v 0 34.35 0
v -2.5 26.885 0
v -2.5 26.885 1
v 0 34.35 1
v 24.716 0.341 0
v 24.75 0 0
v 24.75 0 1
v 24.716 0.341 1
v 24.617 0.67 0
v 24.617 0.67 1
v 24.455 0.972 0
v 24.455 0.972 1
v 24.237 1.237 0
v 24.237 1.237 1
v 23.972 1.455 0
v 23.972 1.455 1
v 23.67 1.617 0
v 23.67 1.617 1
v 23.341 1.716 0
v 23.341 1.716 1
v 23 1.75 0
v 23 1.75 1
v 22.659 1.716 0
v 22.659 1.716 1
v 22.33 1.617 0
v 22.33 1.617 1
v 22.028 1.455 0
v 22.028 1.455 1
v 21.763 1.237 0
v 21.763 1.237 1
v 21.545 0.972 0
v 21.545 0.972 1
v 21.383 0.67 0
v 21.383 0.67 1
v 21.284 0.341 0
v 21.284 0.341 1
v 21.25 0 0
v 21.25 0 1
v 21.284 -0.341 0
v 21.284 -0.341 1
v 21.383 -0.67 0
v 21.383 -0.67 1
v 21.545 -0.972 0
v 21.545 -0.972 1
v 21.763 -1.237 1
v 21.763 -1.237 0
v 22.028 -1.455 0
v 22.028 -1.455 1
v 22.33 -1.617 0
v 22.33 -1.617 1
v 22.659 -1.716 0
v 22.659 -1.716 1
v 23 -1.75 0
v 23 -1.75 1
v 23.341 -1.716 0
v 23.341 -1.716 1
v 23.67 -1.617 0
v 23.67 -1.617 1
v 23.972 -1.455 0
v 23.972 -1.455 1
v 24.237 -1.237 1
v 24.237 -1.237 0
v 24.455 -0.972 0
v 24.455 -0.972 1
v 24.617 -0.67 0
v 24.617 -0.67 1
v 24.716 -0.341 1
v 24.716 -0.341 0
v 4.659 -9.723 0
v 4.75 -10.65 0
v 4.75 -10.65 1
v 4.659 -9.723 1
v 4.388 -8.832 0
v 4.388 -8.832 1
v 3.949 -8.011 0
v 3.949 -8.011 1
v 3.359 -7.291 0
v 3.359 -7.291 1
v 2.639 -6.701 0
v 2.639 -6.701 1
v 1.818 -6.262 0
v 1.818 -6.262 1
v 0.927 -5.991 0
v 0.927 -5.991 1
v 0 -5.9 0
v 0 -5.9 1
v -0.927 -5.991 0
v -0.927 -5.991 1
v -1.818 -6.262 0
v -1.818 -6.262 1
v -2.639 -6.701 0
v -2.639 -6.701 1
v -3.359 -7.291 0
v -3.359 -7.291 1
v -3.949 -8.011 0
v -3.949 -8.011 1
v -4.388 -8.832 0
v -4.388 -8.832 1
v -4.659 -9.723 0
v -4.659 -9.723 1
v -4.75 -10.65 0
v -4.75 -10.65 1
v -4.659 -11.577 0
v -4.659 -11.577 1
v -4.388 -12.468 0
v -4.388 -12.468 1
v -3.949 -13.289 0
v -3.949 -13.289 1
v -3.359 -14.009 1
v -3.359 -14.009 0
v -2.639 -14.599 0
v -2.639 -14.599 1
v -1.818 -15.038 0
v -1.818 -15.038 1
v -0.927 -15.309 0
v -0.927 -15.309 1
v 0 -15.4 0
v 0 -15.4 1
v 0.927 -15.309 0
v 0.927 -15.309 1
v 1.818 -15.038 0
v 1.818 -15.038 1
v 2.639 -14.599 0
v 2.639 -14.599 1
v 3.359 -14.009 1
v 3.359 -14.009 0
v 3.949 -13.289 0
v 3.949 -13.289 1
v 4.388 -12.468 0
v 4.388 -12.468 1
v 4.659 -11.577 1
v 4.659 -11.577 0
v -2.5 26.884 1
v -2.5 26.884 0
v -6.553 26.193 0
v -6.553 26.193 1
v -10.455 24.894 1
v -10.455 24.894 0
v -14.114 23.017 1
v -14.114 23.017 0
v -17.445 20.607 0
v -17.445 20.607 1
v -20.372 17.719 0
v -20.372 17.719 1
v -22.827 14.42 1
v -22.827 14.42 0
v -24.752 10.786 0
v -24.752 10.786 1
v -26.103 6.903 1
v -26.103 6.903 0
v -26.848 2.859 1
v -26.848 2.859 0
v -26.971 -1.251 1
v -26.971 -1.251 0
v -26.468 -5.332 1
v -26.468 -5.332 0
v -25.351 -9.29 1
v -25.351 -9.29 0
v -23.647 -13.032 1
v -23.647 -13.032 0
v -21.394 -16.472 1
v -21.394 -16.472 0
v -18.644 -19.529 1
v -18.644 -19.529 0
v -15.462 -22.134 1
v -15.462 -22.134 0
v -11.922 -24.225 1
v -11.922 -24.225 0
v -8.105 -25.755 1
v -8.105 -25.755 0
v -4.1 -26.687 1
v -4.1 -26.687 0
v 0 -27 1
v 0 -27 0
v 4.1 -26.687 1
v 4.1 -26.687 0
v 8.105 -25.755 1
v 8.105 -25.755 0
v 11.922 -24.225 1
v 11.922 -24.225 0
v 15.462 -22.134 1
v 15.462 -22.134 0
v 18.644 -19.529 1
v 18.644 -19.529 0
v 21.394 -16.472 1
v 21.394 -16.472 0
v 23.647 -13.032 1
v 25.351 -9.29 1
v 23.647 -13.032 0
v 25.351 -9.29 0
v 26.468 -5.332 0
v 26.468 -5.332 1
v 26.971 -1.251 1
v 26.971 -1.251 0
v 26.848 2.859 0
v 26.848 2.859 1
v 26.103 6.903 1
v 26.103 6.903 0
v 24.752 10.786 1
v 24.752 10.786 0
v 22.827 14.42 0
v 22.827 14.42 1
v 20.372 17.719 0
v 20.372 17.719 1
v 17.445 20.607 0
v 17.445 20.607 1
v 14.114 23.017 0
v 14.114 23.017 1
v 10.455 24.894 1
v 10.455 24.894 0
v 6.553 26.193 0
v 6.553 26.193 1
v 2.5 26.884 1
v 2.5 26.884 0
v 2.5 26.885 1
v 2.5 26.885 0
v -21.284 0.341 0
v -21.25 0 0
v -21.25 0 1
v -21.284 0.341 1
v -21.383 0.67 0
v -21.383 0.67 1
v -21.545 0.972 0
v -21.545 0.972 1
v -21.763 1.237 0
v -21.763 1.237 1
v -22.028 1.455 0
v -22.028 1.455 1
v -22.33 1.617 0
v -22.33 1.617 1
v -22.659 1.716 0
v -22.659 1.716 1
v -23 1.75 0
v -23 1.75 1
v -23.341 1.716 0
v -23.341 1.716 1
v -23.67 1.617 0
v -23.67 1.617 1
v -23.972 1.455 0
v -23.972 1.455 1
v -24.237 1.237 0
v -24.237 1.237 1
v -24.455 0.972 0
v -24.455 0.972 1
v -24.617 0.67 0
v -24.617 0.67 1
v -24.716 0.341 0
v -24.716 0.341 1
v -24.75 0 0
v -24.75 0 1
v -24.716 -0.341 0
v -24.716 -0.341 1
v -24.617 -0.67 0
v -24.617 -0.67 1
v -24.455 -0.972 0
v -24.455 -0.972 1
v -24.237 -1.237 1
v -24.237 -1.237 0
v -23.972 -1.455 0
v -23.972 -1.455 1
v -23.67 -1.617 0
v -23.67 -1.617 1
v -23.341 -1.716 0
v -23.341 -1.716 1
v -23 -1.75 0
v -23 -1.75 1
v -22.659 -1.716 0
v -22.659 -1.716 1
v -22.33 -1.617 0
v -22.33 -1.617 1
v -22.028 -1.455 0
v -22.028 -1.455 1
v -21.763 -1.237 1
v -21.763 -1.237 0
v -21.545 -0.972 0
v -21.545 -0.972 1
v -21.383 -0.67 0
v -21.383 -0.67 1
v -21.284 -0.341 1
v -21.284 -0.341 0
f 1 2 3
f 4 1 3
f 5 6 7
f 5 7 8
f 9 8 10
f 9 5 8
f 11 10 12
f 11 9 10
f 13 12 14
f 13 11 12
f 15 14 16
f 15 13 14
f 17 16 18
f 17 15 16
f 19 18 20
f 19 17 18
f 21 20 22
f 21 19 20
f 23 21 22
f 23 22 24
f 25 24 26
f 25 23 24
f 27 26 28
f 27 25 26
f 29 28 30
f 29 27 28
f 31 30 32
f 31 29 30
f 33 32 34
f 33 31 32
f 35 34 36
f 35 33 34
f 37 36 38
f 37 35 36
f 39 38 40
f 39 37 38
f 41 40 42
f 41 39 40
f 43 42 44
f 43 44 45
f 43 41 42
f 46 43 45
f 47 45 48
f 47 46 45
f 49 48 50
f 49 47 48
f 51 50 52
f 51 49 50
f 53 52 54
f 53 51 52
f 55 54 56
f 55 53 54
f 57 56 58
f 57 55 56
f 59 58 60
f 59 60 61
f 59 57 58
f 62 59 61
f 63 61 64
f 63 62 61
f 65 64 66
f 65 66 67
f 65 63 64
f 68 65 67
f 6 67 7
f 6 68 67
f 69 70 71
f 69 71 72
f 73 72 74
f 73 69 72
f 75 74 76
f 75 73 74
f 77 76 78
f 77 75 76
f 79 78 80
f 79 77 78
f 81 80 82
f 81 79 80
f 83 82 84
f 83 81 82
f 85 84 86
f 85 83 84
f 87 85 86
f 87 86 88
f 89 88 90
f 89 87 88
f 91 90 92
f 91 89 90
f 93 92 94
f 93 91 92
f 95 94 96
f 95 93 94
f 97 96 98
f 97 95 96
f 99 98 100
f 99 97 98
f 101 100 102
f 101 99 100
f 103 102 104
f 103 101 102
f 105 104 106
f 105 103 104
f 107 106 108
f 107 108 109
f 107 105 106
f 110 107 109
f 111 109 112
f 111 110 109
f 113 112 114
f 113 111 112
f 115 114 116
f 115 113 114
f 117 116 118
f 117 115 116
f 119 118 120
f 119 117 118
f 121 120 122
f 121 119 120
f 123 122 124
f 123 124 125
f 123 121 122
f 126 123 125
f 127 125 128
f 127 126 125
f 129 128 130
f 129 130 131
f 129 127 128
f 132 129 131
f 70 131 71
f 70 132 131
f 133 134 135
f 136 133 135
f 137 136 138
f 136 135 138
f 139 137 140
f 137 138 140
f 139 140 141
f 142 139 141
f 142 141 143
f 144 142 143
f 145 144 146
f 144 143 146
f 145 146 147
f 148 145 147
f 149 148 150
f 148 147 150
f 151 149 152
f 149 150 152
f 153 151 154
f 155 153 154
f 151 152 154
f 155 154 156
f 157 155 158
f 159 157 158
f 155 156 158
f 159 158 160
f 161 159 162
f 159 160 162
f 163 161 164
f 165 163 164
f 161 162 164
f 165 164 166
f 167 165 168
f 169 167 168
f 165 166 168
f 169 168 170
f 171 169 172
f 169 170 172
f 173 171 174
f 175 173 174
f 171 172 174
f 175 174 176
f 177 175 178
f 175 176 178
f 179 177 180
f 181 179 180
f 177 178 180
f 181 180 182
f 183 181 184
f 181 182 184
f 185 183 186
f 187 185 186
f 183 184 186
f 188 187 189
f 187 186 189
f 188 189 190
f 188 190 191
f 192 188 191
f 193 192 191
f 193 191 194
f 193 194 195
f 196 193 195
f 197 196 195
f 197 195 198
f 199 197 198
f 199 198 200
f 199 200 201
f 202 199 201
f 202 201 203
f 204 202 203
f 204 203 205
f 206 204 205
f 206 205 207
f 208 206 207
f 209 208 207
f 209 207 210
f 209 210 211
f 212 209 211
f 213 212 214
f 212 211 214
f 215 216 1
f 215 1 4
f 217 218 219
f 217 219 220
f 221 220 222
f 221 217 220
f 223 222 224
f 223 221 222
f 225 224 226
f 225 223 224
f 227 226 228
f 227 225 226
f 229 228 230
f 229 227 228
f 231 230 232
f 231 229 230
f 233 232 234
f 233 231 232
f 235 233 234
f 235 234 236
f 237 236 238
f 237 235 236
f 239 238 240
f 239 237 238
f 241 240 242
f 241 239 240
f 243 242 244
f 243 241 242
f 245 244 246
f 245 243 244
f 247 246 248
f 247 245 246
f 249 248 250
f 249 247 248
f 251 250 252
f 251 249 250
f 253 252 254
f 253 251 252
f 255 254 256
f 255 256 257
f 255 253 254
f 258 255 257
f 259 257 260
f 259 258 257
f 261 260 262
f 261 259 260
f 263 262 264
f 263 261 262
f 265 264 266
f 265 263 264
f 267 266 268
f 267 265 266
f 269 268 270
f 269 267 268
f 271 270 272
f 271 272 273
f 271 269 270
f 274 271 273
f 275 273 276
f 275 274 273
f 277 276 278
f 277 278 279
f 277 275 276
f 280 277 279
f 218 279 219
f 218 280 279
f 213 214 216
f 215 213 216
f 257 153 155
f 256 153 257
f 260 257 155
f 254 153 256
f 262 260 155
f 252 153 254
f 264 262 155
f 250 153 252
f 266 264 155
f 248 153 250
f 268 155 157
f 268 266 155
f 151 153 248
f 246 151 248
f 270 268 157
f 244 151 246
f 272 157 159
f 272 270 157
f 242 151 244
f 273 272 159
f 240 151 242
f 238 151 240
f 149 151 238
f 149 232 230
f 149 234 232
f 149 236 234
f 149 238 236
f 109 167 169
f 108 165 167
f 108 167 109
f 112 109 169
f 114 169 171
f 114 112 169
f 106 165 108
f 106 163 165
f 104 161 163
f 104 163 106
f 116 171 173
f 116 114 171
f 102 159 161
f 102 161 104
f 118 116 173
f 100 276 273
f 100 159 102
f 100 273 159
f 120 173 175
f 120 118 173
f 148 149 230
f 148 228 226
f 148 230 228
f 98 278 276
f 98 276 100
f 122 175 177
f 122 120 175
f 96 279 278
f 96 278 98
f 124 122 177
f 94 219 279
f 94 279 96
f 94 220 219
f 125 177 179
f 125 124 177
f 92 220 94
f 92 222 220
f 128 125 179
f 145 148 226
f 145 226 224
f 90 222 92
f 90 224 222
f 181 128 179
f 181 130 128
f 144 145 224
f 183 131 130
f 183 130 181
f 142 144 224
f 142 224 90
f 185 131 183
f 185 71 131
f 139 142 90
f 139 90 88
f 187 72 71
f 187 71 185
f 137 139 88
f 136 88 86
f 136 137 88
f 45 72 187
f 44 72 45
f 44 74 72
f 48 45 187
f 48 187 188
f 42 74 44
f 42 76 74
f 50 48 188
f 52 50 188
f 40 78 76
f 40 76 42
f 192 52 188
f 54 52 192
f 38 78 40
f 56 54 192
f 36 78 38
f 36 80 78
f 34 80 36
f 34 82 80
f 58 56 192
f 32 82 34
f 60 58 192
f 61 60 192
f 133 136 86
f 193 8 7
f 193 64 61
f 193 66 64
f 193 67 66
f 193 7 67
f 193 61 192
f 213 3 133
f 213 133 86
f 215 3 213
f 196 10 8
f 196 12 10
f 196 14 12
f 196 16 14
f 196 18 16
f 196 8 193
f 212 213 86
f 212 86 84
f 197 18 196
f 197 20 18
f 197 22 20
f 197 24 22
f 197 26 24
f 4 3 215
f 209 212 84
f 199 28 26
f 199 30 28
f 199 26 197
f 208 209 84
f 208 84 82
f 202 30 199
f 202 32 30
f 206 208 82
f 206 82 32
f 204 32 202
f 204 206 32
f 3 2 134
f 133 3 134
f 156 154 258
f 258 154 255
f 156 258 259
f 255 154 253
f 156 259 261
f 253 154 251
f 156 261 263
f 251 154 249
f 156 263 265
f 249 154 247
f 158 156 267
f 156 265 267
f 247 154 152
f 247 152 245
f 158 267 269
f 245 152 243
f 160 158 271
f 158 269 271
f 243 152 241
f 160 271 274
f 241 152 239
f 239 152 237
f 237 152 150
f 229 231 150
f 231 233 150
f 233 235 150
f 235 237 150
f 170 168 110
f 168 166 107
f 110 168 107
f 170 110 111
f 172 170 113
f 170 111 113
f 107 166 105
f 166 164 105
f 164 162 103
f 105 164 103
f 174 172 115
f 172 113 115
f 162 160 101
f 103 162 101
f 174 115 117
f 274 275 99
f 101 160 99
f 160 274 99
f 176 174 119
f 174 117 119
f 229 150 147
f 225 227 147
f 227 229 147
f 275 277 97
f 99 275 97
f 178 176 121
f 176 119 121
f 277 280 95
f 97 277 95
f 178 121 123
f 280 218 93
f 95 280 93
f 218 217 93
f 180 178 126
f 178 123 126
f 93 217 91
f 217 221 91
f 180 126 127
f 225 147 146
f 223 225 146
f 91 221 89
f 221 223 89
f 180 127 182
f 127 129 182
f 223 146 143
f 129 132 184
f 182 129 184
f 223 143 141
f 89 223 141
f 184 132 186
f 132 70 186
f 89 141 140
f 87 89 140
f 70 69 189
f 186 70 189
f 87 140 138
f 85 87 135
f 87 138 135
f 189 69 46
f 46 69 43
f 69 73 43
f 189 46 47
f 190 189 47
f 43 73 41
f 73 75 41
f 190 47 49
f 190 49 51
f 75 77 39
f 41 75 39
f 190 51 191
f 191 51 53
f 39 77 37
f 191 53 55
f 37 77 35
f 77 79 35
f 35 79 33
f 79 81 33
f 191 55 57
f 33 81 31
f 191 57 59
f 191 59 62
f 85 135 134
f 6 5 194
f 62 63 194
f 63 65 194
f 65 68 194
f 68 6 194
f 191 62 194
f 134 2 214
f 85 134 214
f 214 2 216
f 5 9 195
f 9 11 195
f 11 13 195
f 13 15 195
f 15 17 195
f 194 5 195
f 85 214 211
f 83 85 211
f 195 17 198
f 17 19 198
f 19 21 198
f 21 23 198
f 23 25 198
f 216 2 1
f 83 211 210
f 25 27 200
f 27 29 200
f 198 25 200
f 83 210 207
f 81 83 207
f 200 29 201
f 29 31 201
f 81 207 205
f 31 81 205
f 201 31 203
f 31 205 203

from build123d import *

# Parameters (mm, degrees)
F0_R       = 1.75
F0_R_2     = 4.75
F1_DEPTH   = 1
F2_SIZE2   = 2.5
F2_SIZE    = 7.465
F2_2_SIZE2 = 2.49999
F2_2_SIZE  = 7.46499


# Not quite as in the source:
# - a fillet or chamfer is up to 0.001 mm smaller than in the source, because OpenCascade refuses the exact size


with BuildPart() as f1:
    # F0 (on Top) → F1 (new body)
    with BuildSketch(Plane.XY):
        with BuildLine():
            Line((-2.5, 34.35), (-2.5, 26.8840101175))
            ThreePointArc((-2.5, 26.8840101175), (0, -27), (2.5, 26.8840101175))
            Line((2.5, 26.8840101175), (2.5, 34.35))
            Line((2.5, 34.35), (-2.5, 34.35))
        make_face()
        with Locations((-23, 0)):
            Circle(F0_R, mode=Mode.SUBTRACT)
        with Locations((0, -10.65)):
            Circle(F0_R_2, mode=Mode.SUBTRACT)
        with Locations((23, 0)):
            Circle(F0_R, mode=Mode.SUBTRACT)
    extrude(amount=F1_DEPTH)

    # F2
    f2_edges = [f1.edges().sort_by_distance(p)[0] for p in [
        (-2.5, 34.35, 0.5),
    ]]
    f2_side = f1.faces().sort_by_distance((-2.5, 30.617005, 0.5))[0]
    chamfer(f2_edges, length=F2_SIZE, length2=F2_SIZE2, reference=f2_side)

    # F2#2 (size 7.465 and 2.5 in the source; OpenCascade refuses exactly that, so slightly less here)
    f2_2_edges = [f1.edges().sort_by_distance(p)[0] for p in [
        (2.5, 34.35, 0.5),
    ]]
    f2_2_side = f1.faces().sort_by_distance((2.5, 30.617005, 0.5))[0]
    chamfer(f2_2_edges, length=F2_2_SIZE, length2=F2_2_SIZE2, reference=f2_2_side)


solid = f1.part
